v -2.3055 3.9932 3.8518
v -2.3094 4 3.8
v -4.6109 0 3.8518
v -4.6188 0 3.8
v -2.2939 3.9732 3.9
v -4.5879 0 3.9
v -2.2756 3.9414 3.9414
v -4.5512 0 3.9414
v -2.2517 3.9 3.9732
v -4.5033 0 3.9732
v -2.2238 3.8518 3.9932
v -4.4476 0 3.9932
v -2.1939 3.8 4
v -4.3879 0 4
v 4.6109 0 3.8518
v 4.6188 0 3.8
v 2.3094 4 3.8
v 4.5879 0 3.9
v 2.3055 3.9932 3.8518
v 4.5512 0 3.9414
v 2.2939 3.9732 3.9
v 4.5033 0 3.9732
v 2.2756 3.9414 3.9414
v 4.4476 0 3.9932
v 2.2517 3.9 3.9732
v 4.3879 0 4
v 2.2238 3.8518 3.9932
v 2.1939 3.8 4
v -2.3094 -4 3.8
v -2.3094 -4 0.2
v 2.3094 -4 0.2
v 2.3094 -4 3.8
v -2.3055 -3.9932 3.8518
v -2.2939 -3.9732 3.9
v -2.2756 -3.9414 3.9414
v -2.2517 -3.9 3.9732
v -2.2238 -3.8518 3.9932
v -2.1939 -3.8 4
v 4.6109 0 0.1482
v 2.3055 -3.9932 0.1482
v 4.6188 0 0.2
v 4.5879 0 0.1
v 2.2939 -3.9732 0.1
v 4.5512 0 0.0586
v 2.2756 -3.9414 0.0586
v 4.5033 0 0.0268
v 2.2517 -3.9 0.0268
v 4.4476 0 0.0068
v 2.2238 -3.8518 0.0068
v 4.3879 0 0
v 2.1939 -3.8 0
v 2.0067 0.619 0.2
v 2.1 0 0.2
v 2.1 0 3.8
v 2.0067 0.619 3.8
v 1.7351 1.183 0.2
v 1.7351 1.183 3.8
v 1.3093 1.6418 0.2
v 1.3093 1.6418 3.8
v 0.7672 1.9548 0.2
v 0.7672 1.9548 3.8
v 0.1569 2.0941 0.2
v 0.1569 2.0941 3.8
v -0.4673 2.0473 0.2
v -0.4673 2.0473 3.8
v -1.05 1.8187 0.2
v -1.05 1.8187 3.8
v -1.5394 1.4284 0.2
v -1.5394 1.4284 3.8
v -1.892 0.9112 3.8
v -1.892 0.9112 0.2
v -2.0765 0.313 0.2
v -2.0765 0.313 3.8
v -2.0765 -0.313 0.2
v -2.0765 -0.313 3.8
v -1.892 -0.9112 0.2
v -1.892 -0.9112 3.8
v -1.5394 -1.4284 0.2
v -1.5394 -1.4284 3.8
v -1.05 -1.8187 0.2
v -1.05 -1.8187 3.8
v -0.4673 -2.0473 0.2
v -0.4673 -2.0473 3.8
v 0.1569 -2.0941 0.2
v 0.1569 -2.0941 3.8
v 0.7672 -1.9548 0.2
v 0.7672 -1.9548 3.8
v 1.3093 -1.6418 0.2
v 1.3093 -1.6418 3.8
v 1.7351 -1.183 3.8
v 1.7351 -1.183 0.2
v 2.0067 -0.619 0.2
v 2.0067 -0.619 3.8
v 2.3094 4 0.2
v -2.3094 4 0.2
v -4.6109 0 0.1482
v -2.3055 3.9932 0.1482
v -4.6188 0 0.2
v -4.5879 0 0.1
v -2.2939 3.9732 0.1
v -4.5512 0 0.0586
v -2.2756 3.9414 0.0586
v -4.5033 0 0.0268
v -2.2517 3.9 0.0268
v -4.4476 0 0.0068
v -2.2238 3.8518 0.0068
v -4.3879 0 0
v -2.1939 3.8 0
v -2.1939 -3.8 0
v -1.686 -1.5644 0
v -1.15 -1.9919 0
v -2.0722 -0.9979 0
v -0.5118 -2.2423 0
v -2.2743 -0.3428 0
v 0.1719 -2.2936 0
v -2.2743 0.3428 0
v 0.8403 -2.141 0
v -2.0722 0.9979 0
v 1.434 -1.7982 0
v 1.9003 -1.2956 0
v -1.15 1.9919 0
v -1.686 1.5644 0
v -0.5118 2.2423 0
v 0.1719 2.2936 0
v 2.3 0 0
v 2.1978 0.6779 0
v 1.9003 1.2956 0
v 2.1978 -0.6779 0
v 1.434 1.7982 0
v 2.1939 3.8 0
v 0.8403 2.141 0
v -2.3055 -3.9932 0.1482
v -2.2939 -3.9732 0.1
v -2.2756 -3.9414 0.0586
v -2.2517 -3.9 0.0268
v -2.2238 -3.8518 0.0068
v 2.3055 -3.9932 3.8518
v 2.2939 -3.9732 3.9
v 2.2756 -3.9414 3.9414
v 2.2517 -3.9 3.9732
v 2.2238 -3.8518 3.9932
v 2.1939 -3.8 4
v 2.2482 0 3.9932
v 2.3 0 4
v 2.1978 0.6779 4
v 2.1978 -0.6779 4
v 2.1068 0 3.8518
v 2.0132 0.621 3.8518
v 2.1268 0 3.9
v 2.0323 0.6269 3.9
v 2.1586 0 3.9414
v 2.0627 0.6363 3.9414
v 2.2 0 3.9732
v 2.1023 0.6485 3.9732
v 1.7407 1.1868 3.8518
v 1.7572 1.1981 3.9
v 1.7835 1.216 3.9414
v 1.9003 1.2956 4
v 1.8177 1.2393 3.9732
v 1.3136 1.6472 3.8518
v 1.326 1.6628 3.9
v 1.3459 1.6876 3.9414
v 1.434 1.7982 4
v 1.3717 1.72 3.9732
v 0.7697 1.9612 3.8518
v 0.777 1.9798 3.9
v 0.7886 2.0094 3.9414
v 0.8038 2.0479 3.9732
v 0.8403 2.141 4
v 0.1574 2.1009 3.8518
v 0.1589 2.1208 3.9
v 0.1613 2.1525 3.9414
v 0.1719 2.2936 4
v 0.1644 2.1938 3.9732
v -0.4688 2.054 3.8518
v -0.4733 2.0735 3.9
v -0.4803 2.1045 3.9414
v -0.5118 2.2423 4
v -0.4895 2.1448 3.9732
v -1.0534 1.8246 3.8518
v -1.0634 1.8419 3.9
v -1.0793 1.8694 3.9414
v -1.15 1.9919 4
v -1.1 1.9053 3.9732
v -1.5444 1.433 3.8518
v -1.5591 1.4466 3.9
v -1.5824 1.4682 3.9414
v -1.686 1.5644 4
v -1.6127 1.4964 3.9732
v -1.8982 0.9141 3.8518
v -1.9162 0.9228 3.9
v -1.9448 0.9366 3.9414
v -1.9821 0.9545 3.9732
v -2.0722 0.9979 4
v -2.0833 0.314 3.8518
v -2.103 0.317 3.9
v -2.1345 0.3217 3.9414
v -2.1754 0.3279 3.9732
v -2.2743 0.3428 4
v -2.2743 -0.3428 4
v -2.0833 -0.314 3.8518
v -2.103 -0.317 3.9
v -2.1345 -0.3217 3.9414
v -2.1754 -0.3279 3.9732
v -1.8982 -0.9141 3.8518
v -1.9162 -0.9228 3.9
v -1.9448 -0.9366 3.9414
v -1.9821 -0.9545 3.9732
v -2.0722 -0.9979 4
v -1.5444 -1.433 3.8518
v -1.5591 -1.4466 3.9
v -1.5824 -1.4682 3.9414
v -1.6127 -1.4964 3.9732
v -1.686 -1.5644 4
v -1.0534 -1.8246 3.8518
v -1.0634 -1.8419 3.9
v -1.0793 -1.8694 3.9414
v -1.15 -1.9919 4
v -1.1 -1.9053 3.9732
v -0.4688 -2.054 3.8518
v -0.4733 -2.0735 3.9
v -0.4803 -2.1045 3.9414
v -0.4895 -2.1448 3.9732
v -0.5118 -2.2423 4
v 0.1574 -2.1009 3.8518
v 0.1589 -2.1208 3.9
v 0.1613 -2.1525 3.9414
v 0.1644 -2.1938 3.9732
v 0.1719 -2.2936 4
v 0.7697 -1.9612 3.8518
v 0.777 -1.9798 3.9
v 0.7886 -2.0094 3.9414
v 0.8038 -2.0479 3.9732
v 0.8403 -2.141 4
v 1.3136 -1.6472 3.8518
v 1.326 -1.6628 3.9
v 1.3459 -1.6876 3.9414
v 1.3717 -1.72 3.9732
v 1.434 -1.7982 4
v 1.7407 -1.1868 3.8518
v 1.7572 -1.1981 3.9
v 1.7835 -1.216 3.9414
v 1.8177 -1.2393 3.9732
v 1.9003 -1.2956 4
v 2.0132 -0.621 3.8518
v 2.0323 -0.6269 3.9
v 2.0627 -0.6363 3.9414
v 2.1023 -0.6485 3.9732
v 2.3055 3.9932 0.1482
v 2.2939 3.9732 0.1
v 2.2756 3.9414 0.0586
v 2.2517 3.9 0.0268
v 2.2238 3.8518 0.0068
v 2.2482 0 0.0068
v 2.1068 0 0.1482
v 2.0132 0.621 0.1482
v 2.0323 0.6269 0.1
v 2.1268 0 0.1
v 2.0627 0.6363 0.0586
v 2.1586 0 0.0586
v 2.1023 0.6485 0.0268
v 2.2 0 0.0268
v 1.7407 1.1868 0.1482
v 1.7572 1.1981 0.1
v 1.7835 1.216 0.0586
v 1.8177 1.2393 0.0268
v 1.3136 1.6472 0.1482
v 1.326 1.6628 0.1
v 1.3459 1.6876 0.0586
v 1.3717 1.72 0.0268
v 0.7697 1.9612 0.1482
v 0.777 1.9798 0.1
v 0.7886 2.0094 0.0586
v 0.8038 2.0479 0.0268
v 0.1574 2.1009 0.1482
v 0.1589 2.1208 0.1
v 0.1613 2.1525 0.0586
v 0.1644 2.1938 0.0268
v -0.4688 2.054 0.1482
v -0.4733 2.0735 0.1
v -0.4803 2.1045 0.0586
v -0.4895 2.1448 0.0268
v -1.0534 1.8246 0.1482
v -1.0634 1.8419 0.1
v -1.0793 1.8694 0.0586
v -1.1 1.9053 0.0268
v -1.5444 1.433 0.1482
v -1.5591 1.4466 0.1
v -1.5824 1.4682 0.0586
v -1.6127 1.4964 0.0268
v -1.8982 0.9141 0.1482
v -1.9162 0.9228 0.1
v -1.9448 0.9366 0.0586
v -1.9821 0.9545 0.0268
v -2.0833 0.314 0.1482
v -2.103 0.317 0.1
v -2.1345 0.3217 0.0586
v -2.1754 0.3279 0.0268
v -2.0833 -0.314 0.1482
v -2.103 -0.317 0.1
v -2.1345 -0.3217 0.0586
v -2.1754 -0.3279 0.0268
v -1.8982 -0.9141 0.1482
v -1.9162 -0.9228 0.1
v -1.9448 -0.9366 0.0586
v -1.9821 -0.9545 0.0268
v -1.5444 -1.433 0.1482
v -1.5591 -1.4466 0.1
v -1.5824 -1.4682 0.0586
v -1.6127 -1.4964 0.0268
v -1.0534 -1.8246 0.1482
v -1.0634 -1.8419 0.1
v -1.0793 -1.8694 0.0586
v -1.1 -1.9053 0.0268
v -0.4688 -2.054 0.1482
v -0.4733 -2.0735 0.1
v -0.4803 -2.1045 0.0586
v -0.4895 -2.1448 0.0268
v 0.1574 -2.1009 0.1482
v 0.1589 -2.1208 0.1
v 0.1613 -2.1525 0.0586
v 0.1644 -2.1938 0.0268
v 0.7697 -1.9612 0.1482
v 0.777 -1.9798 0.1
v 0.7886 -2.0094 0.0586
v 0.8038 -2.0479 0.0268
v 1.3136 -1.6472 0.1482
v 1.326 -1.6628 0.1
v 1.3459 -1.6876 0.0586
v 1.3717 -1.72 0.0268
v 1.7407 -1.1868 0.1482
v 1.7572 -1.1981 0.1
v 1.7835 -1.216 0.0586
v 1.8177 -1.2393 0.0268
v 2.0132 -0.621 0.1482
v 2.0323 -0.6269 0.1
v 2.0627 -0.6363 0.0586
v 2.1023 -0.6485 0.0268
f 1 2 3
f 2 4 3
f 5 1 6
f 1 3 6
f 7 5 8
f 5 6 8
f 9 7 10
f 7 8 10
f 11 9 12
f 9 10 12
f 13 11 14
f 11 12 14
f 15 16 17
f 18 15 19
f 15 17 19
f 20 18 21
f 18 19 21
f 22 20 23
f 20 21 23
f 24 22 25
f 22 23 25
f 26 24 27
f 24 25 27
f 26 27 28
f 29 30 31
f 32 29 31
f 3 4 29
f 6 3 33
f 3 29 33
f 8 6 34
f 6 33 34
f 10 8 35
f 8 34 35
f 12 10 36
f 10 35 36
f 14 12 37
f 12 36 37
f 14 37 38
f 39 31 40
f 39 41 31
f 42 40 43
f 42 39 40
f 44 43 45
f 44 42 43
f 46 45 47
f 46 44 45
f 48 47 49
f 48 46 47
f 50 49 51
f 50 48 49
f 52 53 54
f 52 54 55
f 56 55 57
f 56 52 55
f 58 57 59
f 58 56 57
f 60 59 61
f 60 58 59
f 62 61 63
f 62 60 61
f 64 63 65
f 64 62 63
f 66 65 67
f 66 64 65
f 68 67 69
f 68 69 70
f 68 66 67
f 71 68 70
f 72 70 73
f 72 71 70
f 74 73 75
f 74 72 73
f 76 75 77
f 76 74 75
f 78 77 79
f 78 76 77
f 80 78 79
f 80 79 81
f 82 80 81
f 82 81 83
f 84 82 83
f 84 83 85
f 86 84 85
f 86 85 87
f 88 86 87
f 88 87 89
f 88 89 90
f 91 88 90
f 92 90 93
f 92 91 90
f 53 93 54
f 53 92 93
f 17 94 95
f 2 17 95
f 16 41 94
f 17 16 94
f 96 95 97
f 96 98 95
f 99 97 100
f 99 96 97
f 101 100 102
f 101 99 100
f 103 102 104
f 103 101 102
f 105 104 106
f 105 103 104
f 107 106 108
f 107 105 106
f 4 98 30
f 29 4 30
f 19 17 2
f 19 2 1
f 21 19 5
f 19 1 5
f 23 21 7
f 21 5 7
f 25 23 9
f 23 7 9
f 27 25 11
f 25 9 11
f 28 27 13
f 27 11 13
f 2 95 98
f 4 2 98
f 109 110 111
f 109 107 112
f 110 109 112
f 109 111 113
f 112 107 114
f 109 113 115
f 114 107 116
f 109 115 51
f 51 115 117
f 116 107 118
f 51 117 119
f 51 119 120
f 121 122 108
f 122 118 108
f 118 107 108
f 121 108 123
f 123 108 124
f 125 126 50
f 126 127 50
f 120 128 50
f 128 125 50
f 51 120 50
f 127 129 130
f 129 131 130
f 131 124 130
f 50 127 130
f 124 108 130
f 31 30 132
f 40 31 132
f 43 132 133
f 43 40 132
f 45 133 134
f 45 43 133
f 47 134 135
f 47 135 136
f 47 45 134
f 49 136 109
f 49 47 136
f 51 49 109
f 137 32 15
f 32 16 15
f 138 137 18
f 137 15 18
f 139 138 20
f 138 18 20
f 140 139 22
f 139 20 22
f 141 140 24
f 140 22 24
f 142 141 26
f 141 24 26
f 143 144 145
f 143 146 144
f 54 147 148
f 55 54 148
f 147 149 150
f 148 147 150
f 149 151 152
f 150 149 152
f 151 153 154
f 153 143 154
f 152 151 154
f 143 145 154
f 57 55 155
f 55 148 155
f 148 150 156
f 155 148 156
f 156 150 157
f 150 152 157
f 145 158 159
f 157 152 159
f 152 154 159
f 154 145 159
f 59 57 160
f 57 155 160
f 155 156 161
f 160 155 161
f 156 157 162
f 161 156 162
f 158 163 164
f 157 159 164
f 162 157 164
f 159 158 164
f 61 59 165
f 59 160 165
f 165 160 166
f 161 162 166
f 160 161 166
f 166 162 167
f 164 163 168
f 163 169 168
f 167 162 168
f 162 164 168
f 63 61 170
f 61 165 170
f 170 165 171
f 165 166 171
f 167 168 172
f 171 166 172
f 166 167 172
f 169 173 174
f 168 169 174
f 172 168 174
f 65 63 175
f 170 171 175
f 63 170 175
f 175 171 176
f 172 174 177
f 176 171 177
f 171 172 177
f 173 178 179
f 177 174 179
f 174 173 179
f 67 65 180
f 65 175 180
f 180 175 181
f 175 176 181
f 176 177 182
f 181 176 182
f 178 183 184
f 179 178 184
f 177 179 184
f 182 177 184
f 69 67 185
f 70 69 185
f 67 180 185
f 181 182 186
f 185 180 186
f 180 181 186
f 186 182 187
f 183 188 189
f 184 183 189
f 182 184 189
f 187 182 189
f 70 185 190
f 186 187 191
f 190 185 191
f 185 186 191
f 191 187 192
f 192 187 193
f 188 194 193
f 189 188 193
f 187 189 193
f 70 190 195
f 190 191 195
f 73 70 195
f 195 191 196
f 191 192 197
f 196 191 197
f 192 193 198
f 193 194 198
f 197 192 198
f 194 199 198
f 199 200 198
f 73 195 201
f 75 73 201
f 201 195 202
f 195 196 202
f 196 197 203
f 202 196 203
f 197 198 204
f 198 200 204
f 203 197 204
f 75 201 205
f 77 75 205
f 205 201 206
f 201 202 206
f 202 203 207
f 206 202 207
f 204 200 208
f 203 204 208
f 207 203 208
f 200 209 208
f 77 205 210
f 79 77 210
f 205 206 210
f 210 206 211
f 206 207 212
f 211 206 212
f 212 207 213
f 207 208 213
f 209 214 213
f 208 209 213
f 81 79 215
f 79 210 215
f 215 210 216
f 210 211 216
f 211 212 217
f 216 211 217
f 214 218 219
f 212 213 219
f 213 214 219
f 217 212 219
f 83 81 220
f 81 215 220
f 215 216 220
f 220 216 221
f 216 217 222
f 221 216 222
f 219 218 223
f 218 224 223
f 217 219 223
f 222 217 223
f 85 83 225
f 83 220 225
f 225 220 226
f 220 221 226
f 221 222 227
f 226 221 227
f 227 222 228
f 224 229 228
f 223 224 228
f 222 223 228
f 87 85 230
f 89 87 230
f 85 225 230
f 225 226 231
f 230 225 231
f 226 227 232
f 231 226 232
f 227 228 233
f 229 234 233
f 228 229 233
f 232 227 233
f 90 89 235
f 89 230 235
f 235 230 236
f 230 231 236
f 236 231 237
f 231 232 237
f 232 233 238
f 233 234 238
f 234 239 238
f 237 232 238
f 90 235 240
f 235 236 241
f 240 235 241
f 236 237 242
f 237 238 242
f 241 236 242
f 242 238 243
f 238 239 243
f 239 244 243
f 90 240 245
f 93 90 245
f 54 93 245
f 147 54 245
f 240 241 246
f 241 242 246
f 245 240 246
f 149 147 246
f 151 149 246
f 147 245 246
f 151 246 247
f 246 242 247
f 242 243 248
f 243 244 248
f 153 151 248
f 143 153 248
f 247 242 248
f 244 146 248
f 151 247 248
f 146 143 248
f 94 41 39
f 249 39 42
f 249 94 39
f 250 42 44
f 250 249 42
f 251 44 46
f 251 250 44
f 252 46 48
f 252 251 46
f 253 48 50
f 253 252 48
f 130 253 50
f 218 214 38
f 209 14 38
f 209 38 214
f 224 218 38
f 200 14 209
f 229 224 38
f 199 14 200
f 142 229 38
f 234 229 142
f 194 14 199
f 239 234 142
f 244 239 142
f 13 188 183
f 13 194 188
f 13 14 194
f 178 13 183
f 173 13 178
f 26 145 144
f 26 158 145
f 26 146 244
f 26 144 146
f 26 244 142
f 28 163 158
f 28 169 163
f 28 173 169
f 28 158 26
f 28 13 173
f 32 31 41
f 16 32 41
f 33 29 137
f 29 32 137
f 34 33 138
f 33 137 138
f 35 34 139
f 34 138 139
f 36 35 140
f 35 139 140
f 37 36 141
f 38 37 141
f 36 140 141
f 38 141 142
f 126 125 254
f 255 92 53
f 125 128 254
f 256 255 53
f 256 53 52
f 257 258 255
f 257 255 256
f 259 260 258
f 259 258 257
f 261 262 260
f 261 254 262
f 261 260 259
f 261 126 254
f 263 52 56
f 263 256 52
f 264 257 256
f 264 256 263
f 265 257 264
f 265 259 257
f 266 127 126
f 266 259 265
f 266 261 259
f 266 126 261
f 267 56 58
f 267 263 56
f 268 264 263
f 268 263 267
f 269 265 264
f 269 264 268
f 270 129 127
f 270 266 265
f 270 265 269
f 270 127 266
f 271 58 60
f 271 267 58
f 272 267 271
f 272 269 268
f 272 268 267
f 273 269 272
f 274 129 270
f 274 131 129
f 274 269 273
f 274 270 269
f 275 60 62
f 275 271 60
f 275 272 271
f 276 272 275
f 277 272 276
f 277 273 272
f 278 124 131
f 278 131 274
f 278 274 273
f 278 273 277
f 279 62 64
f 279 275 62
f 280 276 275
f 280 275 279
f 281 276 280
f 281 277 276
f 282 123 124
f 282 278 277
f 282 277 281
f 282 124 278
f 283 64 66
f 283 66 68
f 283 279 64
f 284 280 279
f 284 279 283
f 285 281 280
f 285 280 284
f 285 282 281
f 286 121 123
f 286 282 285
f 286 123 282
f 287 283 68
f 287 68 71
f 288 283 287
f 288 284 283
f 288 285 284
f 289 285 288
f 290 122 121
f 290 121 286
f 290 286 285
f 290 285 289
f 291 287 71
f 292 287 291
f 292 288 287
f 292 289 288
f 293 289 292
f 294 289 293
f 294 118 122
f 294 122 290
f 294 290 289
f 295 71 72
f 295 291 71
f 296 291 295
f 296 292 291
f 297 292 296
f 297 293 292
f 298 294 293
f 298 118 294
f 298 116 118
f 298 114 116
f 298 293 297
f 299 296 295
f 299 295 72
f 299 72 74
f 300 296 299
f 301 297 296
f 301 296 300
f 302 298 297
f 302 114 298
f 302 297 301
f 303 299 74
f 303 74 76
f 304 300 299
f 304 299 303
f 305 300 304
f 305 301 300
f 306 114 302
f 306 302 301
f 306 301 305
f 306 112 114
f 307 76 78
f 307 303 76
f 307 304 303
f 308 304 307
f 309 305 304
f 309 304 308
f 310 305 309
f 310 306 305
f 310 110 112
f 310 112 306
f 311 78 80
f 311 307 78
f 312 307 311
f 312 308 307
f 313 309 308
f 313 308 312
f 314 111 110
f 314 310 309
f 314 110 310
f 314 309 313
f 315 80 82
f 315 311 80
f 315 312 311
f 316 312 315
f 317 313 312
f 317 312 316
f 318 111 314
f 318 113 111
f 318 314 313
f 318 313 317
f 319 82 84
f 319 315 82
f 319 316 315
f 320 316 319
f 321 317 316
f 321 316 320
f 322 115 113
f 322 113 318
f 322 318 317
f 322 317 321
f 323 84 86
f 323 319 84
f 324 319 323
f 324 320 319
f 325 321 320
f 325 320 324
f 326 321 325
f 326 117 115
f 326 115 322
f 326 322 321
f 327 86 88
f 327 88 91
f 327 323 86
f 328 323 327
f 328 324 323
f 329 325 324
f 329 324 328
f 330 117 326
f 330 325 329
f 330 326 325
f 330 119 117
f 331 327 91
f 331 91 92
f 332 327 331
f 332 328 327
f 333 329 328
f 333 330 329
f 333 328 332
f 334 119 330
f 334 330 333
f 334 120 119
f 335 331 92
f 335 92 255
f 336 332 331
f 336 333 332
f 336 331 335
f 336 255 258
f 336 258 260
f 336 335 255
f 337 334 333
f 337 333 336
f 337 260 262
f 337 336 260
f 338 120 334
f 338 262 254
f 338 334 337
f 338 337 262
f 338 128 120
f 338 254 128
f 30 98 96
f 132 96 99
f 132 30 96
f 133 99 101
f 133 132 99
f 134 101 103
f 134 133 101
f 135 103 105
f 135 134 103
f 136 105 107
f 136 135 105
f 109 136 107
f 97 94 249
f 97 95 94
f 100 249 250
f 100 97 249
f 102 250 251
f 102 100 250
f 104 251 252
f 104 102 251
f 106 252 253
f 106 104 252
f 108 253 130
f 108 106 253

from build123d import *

# Parameters (mm, degrees)
SKETCH1_R           = 2.1
BOSS_EXTRUDE1_DEPTH = 4
FILLET1_R           = 0.2


with BuildPart() as part:
    # Sketch1 → Boss-Extrude1 (new body)
    with BuildSketch(Plane.XY):
        Polygon((4.618802154, 0), (2.309401077, 4), (-2.309401077, 4), (-4.618802154, 0), (-2.309401077, -4), (2.309401077, -4), align=None)
        Circle(SKETCH1_R, mode=Mode.SUBTRACT)
    extrude(amount=BOSS_EXTRUDE1_DEPTH)

    # Fillet1
    fillet1_edges = [part.edges().sort_by_distance(p)[0] for p in [
        (0, 4, 4),
        (-3.464101615, 2, 4),
        (-3.464101615, -2, 4),
        (-2.1, 0, 0),
        (-2.1, 0, 4),
        (0, -4, 4),
        (3.464101615, -2, 4),
        (0, -4, 0),
        (-3.464101615, -2, 0),
        (-3.464101615, 2, 0),
        (3.464101615, 2, 4),
        (0, 4, 0),
        (3.464101615, 2, 0),
        (3.464101615, -2, 0),
    ]]
    fillet(fillet1_edges, radius=FILLET1_R)


solid = part.part
